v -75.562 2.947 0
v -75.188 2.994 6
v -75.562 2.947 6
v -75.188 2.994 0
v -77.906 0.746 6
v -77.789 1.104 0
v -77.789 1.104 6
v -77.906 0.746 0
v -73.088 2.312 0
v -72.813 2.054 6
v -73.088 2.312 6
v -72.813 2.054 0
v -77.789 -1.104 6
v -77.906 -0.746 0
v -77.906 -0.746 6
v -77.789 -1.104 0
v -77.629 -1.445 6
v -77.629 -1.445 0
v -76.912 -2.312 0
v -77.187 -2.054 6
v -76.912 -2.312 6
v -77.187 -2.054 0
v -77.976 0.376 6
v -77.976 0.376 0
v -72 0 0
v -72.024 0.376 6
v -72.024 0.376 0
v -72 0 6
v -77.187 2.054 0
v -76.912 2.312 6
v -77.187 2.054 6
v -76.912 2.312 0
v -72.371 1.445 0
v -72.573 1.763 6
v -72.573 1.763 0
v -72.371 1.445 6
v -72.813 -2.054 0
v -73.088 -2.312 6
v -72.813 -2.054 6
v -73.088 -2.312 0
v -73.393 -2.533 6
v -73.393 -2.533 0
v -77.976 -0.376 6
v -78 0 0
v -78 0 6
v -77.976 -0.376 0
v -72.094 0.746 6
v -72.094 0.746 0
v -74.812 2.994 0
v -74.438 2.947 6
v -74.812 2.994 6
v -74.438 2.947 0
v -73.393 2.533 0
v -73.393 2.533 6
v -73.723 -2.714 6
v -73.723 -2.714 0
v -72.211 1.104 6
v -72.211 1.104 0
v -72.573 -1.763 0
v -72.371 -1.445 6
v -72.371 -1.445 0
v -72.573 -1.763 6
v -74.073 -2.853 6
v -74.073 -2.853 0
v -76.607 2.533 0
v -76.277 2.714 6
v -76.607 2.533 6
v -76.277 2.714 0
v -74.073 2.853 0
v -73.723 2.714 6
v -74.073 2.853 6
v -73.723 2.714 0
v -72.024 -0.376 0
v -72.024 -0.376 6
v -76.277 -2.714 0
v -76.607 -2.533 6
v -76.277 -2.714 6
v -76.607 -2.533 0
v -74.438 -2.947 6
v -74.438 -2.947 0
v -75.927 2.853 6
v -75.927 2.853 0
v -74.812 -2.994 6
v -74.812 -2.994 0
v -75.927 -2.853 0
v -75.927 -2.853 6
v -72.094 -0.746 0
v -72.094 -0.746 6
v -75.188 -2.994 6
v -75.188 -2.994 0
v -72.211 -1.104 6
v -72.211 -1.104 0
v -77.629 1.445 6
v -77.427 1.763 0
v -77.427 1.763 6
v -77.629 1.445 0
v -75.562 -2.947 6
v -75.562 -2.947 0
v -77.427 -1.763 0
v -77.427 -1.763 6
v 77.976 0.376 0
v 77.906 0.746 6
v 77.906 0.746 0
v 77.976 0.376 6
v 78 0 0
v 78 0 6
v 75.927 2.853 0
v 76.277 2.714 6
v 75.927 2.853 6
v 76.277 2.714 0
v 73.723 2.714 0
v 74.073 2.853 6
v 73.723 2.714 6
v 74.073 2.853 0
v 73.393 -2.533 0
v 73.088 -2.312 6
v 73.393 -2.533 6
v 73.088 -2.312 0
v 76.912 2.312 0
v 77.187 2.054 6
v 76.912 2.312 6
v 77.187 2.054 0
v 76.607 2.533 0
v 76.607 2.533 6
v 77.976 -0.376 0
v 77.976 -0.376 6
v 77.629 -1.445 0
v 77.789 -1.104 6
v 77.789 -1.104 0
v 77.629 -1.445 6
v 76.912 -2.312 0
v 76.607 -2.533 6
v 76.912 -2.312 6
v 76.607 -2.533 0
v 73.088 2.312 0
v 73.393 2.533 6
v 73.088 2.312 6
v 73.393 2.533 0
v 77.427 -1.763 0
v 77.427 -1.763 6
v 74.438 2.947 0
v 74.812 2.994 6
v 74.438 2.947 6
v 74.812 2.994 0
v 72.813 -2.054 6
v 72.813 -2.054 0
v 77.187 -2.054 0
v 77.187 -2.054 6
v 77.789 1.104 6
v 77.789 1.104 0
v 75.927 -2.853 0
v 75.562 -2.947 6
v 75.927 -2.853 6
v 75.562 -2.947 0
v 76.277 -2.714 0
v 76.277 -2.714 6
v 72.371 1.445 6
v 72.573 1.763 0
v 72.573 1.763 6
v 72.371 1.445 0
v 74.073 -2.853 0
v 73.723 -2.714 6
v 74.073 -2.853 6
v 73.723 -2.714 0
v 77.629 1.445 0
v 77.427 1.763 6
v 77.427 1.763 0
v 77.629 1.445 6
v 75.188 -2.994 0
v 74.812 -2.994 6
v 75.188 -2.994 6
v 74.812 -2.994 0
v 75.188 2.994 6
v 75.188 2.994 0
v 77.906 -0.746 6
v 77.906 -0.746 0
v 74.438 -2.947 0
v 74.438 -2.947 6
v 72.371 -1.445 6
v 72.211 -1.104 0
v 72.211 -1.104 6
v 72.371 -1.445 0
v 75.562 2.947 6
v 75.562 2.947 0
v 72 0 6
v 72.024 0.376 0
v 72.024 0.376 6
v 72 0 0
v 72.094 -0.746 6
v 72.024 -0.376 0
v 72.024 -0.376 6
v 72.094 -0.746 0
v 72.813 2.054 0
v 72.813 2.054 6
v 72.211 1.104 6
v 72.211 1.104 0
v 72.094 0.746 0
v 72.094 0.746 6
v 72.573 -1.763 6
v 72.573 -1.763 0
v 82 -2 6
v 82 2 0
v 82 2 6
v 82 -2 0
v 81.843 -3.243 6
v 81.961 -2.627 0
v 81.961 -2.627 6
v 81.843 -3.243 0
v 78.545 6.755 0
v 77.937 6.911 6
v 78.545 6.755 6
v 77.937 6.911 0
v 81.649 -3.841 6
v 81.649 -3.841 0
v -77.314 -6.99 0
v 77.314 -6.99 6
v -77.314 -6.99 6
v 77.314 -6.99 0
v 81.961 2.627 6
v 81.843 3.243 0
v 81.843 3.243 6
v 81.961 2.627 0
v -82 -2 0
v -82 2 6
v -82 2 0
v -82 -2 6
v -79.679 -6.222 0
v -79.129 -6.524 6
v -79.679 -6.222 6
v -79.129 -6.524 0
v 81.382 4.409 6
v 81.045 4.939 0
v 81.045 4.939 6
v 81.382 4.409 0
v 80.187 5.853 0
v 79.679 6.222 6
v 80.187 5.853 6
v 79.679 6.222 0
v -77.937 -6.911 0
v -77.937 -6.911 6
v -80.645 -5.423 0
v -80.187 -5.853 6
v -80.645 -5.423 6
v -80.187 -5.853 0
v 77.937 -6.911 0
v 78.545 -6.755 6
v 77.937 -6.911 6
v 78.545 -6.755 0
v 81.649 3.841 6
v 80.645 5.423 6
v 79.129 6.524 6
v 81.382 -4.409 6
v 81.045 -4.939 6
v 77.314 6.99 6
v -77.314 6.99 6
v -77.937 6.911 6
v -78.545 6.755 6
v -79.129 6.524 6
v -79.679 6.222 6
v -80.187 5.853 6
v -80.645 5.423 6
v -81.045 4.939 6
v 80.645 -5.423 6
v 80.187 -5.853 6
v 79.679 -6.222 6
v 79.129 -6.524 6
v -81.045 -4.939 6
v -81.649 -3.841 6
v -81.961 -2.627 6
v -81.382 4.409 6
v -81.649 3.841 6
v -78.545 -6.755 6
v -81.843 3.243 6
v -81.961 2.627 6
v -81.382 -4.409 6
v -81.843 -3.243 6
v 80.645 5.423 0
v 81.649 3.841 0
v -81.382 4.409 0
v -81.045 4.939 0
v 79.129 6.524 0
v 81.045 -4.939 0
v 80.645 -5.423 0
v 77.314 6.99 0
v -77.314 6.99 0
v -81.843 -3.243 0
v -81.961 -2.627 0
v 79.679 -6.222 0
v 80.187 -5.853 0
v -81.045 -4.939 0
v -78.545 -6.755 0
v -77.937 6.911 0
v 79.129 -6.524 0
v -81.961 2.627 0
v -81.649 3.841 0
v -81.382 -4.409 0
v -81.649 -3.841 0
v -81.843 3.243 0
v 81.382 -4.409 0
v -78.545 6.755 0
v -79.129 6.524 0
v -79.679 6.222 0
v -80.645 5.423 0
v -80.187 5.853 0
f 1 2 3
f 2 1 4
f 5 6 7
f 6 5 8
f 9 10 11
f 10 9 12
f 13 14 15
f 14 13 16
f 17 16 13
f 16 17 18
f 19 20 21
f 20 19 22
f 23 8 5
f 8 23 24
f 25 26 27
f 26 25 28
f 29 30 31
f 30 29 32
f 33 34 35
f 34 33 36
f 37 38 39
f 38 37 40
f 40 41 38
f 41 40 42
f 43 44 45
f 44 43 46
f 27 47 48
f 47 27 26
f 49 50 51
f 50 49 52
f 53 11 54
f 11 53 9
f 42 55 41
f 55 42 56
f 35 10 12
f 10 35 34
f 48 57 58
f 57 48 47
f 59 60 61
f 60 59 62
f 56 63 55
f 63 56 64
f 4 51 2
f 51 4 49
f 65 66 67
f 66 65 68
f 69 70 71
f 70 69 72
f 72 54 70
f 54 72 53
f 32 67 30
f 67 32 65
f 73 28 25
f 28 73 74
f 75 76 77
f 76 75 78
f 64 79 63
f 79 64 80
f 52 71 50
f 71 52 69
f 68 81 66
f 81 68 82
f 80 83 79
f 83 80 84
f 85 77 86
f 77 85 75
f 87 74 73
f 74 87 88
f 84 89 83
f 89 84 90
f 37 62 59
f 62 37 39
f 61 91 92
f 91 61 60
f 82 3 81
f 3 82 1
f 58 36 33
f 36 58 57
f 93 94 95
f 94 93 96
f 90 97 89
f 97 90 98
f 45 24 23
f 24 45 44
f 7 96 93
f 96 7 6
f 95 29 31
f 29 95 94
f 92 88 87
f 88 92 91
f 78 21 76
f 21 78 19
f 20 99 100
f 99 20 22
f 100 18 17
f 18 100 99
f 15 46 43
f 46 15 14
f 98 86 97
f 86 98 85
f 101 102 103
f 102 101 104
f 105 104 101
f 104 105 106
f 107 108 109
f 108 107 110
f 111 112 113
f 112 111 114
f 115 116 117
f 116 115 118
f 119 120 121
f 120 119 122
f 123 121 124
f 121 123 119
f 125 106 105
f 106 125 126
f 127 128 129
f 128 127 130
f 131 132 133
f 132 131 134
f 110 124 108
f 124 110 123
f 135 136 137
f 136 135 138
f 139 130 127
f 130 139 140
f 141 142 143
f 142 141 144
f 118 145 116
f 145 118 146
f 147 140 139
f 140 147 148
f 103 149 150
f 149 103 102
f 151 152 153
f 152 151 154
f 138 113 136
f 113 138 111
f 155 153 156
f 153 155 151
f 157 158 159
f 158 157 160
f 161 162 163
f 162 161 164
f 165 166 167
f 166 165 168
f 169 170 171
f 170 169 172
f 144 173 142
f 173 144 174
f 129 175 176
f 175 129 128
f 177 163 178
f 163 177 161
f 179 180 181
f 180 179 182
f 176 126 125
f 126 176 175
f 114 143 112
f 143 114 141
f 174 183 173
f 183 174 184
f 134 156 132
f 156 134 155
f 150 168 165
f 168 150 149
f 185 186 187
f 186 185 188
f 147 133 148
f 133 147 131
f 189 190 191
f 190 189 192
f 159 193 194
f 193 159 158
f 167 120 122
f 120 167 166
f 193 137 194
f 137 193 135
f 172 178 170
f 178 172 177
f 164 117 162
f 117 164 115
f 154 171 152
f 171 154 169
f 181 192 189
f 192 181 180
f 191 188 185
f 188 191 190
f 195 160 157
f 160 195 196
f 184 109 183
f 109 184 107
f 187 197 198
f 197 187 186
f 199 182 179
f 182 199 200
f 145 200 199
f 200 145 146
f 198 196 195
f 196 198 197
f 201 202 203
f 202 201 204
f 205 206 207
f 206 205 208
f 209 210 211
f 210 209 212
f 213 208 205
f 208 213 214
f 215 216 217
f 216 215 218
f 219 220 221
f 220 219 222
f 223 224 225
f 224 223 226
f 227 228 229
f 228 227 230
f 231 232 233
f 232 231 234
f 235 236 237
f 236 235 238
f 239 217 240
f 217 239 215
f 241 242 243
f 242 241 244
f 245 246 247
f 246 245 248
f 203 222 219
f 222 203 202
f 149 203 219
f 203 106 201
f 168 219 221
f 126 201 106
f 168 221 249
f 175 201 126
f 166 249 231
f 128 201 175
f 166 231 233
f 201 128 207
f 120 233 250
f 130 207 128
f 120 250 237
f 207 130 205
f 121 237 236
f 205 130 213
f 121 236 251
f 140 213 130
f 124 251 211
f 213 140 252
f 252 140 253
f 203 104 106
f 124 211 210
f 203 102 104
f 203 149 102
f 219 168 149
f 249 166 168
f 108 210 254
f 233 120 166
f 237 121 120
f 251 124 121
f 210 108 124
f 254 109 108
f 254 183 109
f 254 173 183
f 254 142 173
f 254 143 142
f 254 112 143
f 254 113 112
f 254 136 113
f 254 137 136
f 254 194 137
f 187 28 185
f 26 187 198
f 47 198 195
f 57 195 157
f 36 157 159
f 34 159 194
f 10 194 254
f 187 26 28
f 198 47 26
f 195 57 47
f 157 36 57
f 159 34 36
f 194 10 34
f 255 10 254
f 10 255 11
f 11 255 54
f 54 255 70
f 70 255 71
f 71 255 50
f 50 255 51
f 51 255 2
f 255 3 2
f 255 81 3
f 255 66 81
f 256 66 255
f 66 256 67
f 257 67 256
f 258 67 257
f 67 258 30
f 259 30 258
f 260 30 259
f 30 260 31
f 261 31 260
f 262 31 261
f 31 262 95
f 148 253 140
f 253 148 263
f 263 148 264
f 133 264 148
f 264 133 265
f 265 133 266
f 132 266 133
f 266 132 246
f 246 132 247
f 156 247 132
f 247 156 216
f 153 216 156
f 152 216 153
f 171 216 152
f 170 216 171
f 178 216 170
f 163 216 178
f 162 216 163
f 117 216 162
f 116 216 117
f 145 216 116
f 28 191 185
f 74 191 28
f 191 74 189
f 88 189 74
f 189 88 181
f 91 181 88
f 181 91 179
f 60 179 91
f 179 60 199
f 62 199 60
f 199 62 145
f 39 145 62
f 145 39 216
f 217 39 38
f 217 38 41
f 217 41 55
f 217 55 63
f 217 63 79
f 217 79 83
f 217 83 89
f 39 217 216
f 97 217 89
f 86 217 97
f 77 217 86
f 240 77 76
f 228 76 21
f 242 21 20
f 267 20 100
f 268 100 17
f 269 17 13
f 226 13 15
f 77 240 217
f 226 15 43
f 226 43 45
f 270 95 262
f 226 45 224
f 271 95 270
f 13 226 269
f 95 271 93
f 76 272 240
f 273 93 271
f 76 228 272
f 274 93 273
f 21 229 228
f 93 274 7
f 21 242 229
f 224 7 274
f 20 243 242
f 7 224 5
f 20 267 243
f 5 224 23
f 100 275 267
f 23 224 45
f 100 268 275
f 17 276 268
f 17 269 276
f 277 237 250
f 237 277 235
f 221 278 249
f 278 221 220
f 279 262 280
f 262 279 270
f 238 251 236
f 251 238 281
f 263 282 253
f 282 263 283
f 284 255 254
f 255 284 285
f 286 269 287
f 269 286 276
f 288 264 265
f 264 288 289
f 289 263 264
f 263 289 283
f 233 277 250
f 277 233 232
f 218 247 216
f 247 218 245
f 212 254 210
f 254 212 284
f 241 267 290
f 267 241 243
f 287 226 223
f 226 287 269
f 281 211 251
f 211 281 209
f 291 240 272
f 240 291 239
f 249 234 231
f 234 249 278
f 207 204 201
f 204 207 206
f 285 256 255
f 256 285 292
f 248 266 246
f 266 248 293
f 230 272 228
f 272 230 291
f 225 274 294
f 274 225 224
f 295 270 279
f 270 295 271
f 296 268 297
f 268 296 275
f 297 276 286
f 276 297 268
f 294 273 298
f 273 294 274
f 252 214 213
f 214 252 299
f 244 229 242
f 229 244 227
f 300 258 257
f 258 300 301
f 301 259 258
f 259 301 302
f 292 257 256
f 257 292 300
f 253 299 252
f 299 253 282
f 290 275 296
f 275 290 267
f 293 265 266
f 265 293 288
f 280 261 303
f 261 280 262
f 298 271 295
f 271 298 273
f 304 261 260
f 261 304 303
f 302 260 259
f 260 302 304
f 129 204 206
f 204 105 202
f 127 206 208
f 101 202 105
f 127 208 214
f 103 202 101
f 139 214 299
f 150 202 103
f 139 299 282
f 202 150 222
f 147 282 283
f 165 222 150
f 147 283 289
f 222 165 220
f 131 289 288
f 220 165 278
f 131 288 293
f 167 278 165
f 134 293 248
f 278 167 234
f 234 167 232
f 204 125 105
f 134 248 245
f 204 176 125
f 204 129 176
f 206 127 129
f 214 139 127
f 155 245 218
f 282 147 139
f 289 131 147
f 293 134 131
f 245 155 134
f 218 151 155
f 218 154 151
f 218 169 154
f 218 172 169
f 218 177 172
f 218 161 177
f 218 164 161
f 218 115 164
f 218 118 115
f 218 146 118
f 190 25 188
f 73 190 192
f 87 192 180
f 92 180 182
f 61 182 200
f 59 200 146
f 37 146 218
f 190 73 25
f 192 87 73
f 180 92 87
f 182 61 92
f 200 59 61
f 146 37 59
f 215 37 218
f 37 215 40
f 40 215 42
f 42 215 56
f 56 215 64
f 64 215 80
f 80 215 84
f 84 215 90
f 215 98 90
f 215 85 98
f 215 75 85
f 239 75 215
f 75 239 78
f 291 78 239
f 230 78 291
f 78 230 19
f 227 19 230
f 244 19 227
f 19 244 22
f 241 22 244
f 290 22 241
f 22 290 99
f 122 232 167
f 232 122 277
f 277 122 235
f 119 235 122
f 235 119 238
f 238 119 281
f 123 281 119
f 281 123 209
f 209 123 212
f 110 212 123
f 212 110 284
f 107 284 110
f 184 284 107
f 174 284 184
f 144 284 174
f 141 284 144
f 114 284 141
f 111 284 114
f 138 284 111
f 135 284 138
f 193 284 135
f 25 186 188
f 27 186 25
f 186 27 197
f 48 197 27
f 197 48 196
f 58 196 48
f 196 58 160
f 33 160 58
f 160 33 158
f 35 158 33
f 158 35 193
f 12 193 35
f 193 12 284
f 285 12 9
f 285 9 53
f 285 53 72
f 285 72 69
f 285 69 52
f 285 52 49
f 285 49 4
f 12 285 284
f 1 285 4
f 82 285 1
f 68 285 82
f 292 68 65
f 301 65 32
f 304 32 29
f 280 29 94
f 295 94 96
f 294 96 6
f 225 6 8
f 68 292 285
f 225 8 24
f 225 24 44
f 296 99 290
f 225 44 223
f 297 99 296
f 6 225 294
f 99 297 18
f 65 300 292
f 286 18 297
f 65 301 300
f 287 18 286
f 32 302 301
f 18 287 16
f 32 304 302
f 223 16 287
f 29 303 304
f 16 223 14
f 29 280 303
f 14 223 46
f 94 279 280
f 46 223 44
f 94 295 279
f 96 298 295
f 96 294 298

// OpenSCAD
$fn = 50;


difference() {
	union() {
		hull() {
			translate(v = [-77.0000000000, 2.0000000000, 0]) {
				cylinder(h = 6, r = 5);
			}
			translate(v = [77.0000000000, 2.0000000000, 0]) {
				cylinder(h = 6, r = 5);
			}
			translate(v = [-77.0000000000, -2.0000000000, 0]) {
				cylinder(h = 6, r = 5);
			}
			translate(v = [77.0000000000, -2.0000000000, 0]) {
				cylinder(h = 6, r = 5);
			}
		}
	}
	union() {
		translate(v = [-75.0000000000, 0.0000000000, -100.0000000000]) {
			cylinder(h = 200, r = 3.0000000000);
		}
		translate(v = [-75.0000000000, 0.0000000000, -100.0000000000]) {
			cylinder(h = 200, r = 3.0000000000);
		}
		translate(v = [75.0000000000, 0.0000000000, -100.0000000000]) {
			cylinder(h = 200, r = 3.0000000000);
		}
		translate(v = [75.0000000000, 0.0000000000, -100.0000000000]) {
			cylinder(h = 200, r = 3.0000000000);
		}
	}
}
